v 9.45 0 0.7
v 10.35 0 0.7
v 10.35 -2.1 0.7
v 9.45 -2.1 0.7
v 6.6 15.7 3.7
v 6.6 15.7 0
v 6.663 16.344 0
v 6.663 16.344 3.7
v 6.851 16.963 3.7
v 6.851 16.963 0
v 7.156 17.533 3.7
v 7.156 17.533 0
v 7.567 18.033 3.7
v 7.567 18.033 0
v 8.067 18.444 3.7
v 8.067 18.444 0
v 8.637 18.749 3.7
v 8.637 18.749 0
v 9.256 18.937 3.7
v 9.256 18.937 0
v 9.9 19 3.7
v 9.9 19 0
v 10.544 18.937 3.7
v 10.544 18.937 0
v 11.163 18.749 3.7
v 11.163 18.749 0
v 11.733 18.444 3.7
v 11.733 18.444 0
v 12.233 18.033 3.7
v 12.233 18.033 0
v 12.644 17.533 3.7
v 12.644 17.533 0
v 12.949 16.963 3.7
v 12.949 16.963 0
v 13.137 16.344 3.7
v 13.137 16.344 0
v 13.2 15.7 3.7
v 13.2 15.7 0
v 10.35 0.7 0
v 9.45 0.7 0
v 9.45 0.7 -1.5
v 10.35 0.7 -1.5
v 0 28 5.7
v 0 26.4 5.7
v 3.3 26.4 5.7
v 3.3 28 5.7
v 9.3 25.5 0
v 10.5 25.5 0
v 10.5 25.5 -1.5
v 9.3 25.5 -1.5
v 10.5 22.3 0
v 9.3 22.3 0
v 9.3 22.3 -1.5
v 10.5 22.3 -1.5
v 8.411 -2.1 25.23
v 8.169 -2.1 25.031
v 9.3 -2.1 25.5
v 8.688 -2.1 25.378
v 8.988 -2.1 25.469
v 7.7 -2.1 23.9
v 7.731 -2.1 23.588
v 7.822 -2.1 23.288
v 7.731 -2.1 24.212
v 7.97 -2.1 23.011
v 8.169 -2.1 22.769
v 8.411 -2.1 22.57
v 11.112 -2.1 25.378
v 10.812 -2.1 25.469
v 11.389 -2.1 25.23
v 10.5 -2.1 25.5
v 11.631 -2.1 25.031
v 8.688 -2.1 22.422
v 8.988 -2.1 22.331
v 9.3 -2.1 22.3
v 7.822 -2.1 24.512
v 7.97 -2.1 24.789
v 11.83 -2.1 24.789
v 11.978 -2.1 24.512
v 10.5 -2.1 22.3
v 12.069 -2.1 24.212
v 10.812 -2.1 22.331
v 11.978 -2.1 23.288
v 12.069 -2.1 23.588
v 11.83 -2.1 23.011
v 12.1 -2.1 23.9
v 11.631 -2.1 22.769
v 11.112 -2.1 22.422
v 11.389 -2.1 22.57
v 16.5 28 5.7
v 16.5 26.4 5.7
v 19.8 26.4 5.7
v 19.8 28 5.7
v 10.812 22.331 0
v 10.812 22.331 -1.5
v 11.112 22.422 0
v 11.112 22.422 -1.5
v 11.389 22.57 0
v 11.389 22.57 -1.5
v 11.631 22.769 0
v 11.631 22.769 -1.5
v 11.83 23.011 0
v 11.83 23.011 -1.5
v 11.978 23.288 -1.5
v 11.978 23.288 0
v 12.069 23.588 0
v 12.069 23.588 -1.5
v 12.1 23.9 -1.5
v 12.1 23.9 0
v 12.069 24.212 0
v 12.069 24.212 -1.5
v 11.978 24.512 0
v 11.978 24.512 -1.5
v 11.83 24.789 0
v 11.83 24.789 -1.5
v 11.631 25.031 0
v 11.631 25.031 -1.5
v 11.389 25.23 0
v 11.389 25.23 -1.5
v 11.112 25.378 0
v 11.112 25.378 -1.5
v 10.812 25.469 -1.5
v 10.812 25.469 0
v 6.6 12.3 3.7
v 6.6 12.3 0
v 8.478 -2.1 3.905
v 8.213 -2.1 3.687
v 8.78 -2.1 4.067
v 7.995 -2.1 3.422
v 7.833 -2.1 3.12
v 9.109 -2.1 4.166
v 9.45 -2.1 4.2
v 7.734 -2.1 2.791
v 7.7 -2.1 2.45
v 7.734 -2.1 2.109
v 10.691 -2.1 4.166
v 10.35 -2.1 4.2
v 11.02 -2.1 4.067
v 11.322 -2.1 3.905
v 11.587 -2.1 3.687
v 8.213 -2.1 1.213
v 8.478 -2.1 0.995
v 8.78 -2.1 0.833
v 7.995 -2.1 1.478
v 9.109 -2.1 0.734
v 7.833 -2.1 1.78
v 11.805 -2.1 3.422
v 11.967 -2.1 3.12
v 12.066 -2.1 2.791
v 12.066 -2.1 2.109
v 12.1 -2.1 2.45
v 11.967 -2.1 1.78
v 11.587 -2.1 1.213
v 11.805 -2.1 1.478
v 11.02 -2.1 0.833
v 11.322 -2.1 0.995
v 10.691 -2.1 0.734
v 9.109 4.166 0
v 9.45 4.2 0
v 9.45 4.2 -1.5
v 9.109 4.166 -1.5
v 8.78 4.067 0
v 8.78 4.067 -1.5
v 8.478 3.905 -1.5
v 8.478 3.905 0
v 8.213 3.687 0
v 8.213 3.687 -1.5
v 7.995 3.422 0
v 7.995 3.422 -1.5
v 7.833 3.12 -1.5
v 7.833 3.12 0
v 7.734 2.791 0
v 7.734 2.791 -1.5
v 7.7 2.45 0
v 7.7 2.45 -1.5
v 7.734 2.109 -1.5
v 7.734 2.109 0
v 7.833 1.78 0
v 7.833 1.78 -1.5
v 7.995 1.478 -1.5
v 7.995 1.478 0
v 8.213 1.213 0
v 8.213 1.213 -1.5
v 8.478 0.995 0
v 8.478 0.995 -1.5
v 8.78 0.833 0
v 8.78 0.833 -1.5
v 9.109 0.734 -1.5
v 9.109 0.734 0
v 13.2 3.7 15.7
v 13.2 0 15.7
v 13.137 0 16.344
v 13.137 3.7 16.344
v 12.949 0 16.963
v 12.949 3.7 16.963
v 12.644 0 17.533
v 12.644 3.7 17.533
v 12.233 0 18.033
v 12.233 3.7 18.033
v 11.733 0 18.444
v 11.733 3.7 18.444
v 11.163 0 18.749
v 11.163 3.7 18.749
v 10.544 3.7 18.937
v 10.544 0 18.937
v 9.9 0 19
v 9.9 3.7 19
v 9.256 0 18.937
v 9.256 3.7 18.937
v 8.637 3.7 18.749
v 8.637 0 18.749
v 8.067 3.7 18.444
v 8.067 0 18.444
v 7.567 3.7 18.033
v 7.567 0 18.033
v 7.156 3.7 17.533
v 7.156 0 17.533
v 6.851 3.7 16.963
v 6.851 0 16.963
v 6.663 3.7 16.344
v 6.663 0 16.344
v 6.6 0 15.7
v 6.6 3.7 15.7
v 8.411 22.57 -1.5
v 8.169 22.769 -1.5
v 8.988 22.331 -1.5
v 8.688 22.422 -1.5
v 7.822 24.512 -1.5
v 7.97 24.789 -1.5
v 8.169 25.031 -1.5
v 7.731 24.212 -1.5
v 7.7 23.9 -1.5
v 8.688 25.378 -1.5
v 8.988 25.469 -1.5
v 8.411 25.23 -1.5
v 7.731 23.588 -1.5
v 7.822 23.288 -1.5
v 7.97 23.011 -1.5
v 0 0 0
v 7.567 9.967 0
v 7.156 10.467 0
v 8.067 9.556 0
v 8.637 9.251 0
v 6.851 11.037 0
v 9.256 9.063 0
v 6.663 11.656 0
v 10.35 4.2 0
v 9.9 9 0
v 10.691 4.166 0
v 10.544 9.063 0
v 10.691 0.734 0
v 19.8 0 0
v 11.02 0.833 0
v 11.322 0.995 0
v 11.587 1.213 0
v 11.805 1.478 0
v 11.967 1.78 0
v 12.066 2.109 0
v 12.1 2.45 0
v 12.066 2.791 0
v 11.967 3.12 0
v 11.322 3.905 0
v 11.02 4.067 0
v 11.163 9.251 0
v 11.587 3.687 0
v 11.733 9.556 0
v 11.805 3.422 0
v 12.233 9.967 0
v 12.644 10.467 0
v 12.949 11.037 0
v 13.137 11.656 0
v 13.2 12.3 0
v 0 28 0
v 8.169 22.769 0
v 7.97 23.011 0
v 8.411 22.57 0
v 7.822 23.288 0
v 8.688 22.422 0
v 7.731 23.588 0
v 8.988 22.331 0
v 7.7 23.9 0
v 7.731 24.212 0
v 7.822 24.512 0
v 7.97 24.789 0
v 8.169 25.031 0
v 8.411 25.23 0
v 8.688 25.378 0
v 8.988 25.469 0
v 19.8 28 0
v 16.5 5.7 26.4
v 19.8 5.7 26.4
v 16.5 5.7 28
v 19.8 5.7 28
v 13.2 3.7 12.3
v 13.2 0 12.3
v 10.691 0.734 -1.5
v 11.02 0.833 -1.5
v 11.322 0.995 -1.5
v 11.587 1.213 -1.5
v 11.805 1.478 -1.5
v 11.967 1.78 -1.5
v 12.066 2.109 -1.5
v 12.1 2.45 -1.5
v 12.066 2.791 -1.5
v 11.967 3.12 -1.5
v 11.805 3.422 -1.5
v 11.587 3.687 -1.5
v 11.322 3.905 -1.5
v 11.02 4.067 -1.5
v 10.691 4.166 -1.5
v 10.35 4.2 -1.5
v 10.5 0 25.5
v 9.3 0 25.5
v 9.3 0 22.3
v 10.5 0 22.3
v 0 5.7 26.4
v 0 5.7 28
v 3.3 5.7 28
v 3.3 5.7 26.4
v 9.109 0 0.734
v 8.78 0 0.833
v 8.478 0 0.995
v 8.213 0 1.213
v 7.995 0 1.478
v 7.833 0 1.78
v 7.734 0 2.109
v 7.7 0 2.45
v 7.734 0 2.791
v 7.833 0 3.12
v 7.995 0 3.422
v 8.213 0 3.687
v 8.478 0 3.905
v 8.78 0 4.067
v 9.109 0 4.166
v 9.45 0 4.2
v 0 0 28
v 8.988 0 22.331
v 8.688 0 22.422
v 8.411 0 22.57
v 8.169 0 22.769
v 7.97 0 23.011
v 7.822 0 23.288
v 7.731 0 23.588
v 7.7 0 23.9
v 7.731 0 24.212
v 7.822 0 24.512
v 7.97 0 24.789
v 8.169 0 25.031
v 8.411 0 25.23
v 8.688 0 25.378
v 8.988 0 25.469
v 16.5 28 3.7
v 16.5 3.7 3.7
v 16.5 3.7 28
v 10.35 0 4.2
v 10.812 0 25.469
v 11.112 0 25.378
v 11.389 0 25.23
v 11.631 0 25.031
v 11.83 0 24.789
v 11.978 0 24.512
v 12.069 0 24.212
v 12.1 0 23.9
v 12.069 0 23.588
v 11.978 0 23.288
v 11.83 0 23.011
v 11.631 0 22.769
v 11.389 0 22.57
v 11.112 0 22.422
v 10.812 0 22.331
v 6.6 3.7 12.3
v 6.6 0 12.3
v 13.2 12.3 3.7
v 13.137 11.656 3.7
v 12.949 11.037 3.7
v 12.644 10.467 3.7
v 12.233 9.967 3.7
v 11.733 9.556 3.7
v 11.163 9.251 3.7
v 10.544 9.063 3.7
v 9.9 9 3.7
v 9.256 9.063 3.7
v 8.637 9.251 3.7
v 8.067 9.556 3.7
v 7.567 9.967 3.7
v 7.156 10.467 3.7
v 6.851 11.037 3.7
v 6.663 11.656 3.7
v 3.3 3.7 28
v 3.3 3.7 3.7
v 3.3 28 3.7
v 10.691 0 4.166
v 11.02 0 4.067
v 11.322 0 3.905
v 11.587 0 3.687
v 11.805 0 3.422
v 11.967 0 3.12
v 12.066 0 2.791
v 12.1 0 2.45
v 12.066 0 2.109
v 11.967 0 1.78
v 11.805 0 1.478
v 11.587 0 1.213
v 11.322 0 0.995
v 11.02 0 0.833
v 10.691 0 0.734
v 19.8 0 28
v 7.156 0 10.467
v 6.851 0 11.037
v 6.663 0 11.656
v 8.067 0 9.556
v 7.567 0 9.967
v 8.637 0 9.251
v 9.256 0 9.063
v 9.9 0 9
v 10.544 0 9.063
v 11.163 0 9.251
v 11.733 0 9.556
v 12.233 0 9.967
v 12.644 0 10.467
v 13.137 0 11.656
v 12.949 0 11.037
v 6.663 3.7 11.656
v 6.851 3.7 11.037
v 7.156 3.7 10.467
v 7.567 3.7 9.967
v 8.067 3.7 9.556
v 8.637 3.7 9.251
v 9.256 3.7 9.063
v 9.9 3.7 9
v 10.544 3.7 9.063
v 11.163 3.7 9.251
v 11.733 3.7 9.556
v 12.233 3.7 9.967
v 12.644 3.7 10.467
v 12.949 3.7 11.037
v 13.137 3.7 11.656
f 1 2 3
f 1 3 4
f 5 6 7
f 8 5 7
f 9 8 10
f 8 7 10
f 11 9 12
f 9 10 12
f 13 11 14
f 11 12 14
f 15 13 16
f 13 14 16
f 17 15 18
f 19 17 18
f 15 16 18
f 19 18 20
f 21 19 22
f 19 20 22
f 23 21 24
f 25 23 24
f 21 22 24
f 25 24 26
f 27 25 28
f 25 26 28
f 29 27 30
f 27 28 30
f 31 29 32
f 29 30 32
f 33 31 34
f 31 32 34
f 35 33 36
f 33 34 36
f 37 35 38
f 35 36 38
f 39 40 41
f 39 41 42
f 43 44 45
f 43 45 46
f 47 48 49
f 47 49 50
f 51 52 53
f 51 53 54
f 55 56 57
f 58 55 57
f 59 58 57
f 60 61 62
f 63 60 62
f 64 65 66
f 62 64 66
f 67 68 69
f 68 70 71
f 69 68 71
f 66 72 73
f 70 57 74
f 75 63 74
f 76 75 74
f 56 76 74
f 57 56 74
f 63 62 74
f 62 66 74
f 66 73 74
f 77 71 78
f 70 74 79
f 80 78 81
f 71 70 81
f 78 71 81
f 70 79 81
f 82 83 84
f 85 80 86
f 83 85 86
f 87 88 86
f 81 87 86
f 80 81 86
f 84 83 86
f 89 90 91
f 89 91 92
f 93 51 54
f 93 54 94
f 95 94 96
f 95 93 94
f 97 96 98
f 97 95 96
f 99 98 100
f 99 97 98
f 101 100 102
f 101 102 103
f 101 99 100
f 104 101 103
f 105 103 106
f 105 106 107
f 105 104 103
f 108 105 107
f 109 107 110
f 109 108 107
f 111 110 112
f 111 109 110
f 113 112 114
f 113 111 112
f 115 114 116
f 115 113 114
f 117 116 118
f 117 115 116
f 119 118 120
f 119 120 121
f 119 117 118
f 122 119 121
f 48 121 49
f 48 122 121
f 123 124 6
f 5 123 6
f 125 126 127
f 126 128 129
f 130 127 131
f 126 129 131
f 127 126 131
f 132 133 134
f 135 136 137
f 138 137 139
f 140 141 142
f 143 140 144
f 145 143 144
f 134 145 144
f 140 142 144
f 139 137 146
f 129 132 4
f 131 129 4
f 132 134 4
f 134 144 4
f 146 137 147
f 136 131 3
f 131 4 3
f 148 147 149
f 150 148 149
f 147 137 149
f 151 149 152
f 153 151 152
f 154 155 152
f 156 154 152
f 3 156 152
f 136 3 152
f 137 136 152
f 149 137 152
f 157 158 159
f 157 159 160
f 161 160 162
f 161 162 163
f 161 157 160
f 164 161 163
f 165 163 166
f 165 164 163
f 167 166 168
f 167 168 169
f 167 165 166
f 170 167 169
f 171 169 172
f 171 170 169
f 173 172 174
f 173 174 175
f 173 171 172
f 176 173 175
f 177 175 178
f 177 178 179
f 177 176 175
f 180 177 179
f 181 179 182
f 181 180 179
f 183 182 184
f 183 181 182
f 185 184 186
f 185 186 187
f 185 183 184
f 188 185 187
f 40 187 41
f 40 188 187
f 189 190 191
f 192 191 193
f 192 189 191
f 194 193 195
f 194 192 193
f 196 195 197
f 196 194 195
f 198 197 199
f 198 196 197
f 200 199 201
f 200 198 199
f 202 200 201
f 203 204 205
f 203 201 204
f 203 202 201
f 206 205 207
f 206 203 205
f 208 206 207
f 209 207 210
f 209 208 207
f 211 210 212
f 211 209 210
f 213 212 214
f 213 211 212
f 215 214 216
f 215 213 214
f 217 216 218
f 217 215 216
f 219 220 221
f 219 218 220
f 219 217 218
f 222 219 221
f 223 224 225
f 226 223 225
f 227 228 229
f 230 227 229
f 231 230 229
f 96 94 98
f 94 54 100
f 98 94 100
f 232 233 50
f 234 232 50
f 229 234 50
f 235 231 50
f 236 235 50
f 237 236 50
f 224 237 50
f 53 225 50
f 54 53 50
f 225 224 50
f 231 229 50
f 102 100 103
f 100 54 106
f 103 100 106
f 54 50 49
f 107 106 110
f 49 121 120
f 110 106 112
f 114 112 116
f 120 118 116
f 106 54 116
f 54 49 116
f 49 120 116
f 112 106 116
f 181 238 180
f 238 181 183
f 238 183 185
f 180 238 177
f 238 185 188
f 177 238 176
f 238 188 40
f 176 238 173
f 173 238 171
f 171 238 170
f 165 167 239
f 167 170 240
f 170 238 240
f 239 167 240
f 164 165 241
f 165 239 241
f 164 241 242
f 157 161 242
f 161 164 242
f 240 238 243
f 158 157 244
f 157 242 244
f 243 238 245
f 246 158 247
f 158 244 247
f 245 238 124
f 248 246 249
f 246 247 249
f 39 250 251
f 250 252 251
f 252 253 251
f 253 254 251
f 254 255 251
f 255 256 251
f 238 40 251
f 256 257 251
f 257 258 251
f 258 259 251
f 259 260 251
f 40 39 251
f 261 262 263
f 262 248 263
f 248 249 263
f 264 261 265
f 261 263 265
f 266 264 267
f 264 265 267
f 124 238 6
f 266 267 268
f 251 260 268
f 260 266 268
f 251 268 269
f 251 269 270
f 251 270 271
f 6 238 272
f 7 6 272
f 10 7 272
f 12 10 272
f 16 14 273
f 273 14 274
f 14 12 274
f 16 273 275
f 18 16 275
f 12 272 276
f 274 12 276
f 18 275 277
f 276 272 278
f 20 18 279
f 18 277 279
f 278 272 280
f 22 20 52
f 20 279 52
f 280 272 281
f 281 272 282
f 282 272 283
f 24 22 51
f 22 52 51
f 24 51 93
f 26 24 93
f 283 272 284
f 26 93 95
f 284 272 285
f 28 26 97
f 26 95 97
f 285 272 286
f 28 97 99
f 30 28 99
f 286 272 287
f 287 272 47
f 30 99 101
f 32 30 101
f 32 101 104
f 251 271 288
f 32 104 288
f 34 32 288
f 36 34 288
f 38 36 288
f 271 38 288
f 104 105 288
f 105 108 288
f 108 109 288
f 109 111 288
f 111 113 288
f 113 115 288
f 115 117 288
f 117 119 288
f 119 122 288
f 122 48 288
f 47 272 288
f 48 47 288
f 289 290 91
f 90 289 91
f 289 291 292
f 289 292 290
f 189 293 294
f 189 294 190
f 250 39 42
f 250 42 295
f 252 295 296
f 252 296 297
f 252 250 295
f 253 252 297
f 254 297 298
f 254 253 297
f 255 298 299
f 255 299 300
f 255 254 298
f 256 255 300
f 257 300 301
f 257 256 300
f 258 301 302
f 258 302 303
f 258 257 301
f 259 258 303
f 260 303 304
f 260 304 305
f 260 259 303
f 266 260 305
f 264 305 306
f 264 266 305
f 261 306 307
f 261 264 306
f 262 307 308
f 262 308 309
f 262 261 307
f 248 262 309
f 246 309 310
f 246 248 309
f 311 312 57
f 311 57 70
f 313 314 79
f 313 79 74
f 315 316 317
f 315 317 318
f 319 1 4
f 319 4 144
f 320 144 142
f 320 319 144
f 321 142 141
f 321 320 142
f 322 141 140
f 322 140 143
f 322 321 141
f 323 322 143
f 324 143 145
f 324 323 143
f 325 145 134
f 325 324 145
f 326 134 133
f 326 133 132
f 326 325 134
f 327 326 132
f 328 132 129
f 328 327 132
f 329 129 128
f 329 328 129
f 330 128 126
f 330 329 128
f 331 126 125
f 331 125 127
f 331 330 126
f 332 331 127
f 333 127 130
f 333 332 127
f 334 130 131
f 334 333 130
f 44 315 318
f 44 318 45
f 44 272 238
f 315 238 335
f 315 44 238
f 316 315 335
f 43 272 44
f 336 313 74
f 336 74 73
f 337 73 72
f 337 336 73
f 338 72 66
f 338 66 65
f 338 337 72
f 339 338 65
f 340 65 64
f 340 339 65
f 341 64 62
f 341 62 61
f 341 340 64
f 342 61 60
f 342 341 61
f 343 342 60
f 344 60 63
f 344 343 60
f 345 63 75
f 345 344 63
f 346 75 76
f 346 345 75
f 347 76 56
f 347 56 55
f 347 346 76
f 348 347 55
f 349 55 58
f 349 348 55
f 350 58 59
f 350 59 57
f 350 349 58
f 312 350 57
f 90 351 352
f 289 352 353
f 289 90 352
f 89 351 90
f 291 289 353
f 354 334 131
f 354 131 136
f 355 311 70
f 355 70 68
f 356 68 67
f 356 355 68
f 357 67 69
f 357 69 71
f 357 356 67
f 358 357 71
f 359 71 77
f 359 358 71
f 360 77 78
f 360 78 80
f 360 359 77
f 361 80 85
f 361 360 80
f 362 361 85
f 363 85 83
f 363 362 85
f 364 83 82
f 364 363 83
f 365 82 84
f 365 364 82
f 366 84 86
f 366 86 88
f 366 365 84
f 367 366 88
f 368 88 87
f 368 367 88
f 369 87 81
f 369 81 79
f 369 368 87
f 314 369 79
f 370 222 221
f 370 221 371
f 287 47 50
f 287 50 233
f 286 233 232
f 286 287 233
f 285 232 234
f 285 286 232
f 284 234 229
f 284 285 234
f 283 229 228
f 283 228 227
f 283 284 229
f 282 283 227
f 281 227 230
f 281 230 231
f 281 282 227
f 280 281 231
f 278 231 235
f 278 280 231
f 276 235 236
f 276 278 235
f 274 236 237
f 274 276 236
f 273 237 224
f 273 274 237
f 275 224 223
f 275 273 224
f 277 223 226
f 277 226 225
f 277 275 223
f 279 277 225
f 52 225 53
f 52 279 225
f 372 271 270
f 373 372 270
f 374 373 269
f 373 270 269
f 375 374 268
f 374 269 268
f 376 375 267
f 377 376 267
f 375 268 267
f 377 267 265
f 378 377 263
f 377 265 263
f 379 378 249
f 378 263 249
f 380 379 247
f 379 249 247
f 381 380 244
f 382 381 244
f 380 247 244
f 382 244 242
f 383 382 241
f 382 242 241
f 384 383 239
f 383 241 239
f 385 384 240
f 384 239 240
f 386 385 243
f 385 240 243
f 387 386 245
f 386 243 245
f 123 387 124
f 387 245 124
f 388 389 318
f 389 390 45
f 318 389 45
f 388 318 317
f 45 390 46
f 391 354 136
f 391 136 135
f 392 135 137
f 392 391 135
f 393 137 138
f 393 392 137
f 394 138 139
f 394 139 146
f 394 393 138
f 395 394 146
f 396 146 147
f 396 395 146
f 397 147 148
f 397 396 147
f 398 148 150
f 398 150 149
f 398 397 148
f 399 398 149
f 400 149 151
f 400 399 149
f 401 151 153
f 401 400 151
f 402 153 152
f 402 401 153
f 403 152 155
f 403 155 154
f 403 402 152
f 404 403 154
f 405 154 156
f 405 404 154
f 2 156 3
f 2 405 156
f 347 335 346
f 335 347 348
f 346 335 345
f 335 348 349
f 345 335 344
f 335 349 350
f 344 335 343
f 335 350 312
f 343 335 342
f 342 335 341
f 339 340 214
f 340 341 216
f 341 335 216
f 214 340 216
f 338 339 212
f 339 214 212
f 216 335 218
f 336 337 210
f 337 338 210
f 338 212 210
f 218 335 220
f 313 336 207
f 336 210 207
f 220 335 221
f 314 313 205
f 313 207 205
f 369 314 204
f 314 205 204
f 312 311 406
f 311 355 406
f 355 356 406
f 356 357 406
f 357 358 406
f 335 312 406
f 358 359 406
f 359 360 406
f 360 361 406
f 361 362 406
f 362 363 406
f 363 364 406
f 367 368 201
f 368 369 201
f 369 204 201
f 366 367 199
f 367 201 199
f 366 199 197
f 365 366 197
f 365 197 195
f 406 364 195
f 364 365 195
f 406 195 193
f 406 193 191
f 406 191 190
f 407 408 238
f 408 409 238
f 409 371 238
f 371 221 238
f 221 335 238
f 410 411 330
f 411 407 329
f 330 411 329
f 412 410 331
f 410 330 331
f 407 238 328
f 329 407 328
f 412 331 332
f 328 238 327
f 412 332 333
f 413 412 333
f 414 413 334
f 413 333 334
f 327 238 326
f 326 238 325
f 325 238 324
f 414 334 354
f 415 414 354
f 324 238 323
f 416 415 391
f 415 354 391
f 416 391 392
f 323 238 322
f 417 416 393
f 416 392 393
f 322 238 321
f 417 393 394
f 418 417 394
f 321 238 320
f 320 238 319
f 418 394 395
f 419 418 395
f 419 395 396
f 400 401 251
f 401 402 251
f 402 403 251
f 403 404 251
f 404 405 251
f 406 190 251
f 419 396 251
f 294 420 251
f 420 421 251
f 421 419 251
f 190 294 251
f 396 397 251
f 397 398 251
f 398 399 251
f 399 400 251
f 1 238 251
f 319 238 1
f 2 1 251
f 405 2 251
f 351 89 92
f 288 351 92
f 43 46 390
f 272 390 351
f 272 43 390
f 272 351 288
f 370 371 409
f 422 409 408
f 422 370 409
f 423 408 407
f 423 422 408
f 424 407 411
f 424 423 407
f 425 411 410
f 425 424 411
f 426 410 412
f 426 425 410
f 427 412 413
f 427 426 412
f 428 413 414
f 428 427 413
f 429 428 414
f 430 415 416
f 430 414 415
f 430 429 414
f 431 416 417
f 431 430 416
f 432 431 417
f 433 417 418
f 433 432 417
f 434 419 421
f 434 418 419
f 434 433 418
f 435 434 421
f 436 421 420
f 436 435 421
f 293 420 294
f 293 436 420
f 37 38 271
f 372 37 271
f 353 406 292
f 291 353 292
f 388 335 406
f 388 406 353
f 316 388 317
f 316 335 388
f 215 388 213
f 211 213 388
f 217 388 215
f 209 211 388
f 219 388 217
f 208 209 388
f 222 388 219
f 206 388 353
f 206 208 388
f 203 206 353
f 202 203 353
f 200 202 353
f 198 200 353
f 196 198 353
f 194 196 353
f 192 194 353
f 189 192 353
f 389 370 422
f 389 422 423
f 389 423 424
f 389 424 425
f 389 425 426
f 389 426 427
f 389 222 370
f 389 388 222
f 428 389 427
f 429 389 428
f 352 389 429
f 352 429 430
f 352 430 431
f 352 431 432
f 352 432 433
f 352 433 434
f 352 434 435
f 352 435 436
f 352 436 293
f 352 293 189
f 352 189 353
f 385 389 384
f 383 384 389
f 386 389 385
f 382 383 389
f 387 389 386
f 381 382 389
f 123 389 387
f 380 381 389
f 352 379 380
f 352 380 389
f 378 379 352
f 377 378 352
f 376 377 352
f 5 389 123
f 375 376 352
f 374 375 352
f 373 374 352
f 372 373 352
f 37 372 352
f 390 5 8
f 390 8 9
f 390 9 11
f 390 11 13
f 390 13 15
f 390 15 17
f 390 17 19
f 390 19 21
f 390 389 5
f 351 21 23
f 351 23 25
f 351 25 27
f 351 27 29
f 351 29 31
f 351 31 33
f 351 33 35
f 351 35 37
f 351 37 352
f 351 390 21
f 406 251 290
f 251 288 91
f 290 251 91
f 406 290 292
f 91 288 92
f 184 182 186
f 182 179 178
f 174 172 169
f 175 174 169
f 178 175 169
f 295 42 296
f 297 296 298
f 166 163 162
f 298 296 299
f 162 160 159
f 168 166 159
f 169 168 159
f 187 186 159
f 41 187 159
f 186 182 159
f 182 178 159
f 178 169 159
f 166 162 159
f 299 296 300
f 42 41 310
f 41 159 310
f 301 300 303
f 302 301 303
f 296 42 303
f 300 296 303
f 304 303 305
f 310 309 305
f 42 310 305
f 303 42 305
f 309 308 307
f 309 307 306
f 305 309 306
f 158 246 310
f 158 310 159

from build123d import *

# Parameters (mm, degrees)
SKETCH1_W           = 19.8
SKETCH1_H           = 28
BOSS_EXTRUDE1_DEPTH = 3.7
SKETCH2_W           = 19.8
SKETCH2_H           = 3.7
BOSS_EXTRUDE2_DEPTH = 24.3
CUT_EXTRUDE1_DEPTH  = 9
BOSS_EXTRUDE3_DEPTH = 3.3
BOSS_EXTRUDE4_DEPTH = 3.3
BOSS_EXTRUDE5_DEPTH = 2.1
BOSS_EXTRUDE6_DEPTH = 1.5


with BuildPart() as part:
    # Sketch1 → Boss-Extrude1 (new body)
    with BuildSketch(Plane.XY):
        with Locations((9.9, 14)):
            Rectangle(SKETCH1_W, SKETCH1_H)
        with BuildLine():
            Line((13.2, 15.7), (13.2, 12.3))
            ThreePointArc((13.2, 12.3), (9.9, 9), (6.6, 12.3))
            Line((6.6, 12.3), (6.6, 15.7))
            ThreePointArc((6.6, 15.7), (9.9, 19), (13.2, 15.7))
        make_face(mode=Mode.SUBTRACT)
    extrude(amount=BOSS_EXTRUDE1_DEPTH)

    # Sketch2 → Boss-Extrude2 (add)
    with BuildSketch(Plane.XY.offset(3.7)):
        with Locations((9.9, 1.85)):
            Rectangle(SKETCH2_W, SKETCH2_H)
    extrude(amount=BOSS_EXTRUDE2_DEPTH)

    # Sketch3 → Cut-Extrude1 (cut)
    with BuildSketch(Plane(origin=(0, 3.7, 0), x_dir=(1, 0, 0), z_dir=(0, 1, 0))):
        with BuildLine():
            Line((13.2, -12.3), (13.2, -15.7))
            ThreePointArc((13.2, -15.7), (9.9, -19), (6.6, -15.7))
            Line((6.6, -15.7), (6.6, -12.3))
            ThreePointArc((6.6, -12.3), (9.9, -9), (13.2, -12.3))
        make_face()
    extrude(amount=-CUT_EXTRUDE1_DEPTH, mode=Mode.SUBTRACT)

    # Sketch4 → Boss-Extrude3 (add)
    with BuildSketch(Plane(origin=(19.8, 0, 0), x_dir=(0, 0, -1), z_dir=(1, 0, 0))):
        Polygon((-3.7, 26.4), (-3.7, 3.7), (-26.4, 3.7), (-28, 3.7), (-28, 5.7), (-26.4, 5.7), (-5.7, 26.4), (-5.7, 28), (-3.7, 28), align=None)
    extrude(amount=-BOSS_EXTRUDE3_DEPTH)

    # Sketch5 → Boss-Extrude4 (add)
    with BuildSketch(Plane.ZY):
        Polygon((3.7, 26), (3.7, 3.7), (26, 3.7), (28, 3.7), (28, 5.7), (26.4, 5.7), (5.7, 26.4), (5.7, 28), (3.7, 28), align=None)
    extrude(amount=-BOSS_EXTRUDE4_DEPTH)

    # Sketch6 → Boss-Extrude5 (add)
    with BuildSketch(Plane(origin=(0, 0, 0), x_dir=(-1, 0, 0), z_dir=(0, -1, 0))):
        with BuildLine():
            Line((-9.3, -25.5), (-10.5, -25.5))
            ThreePointArc((-10.5, -25.5), (-12.1, -23.9), (-10.5, -22.3))
            Line((-10.5, -22.3), (-9.3, -22.3))
            ThreePointArc((-9.3, -22.3), (-7.7, -23.9), (-9.3, -25.5))
        make_face()
        with BuildLine():
            Line((-9.45, -4.2), (-10.35, -4.2))
            ThreePointArc((-10.35, -4.2), (-12.1, -2.45), (-10.35, -0.7))
            Line((-10.35, -0.7), (-9.45, -0.7))
            ThreePointArc((-9.45, -0.7), (-7.7, -2.45), (-9.45, -4.2))
        make_face()
    extrude(amount=BOSS_EXTRUDE5_DEPTH)

    # Sketch7 → Boss-Extrude6 (add)
    with BuildSketch(Plane(origin=(0, 0, 0), x_dir=(-1, 0, 0), z_dir=(0, 0, -1))):
        with BuildLine():
            Line((-10.5, 25.5), (-9.3, 25.5))
            ThreePointArc((-9.3, 25.5), (-7.7, 23.9), (-9.3, 22.3))
            Line((-9.3, 22.3), (-10.5, 22.3))
            ThreePointArc((-10.5, 22.3), (-12.1, 23.9), (-10.5, 25.5))
        make_face()
        with BuildLine():
            Line((-10.35, 4.2), (-9.45, 4.2))
            ThreePointArc((-9.45, 4.2), (-7.7, 2.45), (-9.45, 0.7))
            Line((-9.45, 0.7), (-10.35, 0.7))
            ThreePointArc((-10.35, 0.7), (-12.1, 2.45), (-10.35, 4.2))
        make_face()
    extrude(amount=BOSS_EXTRUDE6_DEPTH)


solid = part.part
